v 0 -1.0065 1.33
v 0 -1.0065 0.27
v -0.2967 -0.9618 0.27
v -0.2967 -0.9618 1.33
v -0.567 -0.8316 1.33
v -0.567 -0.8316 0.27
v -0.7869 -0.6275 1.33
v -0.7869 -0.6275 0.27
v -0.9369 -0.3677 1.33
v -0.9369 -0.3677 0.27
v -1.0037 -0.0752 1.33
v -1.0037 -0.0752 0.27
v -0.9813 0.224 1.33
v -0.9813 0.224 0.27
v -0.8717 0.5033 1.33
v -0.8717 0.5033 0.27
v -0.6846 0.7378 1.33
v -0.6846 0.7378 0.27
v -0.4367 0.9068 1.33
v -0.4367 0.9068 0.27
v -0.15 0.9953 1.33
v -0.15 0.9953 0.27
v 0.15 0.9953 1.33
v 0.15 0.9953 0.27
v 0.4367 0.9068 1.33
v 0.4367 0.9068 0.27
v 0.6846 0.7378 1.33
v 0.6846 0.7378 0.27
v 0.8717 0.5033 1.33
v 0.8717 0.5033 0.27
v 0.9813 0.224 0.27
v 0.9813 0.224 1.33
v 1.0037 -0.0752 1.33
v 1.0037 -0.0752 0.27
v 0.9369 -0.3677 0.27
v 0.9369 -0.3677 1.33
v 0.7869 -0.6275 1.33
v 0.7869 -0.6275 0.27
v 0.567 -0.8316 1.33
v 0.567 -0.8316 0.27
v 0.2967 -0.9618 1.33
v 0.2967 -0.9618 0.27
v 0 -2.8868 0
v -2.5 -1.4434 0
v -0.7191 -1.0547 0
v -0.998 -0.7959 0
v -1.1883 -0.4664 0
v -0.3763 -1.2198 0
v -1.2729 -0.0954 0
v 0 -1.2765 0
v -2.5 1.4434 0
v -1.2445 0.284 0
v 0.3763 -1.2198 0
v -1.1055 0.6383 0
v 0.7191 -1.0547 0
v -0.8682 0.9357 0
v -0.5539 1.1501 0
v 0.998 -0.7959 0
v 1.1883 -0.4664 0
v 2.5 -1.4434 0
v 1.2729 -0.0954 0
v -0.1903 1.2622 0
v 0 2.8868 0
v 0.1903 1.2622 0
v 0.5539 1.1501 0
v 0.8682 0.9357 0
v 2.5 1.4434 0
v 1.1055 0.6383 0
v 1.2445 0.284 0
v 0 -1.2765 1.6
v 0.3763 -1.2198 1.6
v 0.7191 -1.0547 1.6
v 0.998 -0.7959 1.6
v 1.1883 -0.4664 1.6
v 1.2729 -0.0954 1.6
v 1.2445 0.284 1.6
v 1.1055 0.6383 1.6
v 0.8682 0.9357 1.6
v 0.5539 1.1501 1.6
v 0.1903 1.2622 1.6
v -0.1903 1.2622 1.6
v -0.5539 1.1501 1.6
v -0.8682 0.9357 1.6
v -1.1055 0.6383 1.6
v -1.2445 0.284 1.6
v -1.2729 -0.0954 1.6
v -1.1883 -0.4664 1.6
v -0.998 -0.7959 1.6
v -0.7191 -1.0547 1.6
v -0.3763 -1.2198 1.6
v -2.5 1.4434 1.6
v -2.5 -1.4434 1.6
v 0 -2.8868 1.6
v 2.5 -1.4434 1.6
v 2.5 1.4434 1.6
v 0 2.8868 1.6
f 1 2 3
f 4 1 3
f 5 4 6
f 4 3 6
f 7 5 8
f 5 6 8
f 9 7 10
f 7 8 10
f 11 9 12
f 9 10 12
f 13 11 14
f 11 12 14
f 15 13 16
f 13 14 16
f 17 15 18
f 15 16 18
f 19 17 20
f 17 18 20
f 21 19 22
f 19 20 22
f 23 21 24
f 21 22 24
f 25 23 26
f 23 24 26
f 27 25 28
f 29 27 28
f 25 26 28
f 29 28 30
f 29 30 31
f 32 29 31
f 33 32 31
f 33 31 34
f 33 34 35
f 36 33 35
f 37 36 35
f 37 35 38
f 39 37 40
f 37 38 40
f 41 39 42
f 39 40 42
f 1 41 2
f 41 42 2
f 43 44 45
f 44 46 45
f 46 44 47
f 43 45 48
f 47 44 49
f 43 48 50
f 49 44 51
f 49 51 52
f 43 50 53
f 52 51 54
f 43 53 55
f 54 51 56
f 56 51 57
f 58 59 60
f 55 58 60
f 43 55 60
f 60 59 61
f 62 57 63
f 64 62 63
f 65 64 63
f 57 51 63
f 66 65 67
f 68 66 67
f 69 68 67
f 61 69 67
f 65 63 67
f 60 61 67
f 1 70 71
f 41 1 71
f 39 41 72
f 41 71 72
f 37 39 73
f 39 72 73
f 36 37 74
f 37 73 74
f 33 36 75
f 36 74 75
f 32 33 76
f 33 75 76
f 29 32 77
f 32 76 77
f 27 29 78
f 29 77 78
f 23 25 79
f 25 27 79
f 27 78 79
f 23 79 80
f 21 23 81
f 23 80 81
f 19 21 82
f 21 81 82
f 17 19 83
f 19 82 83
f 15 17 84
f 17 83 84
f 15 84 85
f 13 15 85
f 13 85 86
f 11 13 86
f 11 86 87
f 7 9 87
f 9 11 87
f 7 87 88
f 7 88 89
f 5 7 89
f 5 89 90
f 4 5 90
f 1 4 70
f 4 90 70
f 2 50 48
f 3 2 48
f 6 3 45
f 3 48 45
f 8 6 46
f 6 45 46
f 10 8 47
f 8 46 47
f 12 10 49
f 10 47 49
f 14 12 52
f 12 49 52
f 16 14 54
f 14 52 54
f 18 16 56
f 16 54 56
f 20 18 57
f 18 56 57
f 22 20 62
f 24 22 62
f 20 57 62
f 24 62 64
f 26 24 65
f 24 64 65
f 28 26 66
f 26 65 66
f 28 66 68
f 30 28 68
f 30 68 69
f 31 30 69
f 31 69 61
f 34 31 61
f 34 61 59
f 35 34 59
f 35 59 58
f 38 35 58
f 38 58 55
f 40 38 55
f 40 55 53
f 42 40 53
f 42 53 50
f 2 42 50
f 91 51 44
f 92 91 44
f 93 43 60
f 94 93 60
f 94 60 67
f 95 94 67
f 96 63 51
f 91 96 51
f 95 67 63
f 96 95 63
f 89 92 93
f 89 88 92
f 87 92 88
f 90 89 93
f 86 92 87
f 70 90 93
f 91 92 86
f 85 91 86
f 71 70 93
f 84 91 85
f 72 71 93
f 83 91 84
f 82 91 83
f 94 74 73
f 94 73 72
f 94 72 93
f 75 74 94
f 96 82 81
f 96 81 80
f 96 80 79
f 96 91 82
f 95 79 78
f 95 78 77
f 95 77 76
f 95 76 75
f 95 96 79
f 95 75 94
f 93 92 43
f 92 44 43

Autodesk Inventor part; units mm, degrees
sketch "Эскиз1" plane through (0, 0, 0) normal (0, 0, 1) x (1, 0, 0)
  circle A0 centre (0, 0) radius 2.5 construction
  line L0 (-2.5, 1.4434) -> (-2.5, -1.4434)
  line L1 (-2.5, -1.4434) -> (0, -2.8868)
  line L2 (0, -2.8868) -> (2.5, -1.4434)
  line L3 (2.5, -1.4434) -> (2.5, 1.4434)
  line L4 (2.5, 1.4434) -> (0, 2.8868)
  line L5 (0, 2.8868) -> (-2.5, 1.4434)
  line L6 (0, 4.0415) -> (0, -4.0415) projected
  line L7 (-3.5, 0) -> (3.5, 0) projected
  point P0 (0, 0)
  dimension "ParS" = 5
extrude "Выдавливание1" add sketch "Эскиз1" along normal blind 1.6
sketch "Эскиз2" plane through (0, 0, 1.6) normal (0, 0, 1) x (1, 0, 0)
  point P0 (0, 0)
  point P1 (0, 0)
hole "Отверстие1" at (0, 0, 1.6) direction (0, 0, -1) diameter 2.013 end through all thread size "M2.5x0.45" class "6H" standard "ISO Metric profile"
ref_plane "MSC_PT1" through (0, 0, 1.6) normal (0, 0, 1) x (1, 0, 0)
ref_plane "MSC_PT2" through (0, 0, 0) normal (0, 0, -1) x (-1, 0, 0)
ref_plane "MSC_PF1" through (0, 0, 0) normal (1, 0, 0) x (0, 1, 0)
chamfer "Фаска1" distance 0.27 angle 45 2 edges at (0, 1.0065, 1.6) (0, 1.0065, 0)
equation "\"d4\" = M"
equation "\"d17\" = 0.6 * PTC"
equation "\"d18\" = 0.6 * PTC"
equation "\"PTC\" = 0.45"
equation "\"NND\" = 2.5"
equation "\"THREADDIA\" = NND"
properties part number "BS EN 24 036 - M2.5" material "Сталь, мягкая"
